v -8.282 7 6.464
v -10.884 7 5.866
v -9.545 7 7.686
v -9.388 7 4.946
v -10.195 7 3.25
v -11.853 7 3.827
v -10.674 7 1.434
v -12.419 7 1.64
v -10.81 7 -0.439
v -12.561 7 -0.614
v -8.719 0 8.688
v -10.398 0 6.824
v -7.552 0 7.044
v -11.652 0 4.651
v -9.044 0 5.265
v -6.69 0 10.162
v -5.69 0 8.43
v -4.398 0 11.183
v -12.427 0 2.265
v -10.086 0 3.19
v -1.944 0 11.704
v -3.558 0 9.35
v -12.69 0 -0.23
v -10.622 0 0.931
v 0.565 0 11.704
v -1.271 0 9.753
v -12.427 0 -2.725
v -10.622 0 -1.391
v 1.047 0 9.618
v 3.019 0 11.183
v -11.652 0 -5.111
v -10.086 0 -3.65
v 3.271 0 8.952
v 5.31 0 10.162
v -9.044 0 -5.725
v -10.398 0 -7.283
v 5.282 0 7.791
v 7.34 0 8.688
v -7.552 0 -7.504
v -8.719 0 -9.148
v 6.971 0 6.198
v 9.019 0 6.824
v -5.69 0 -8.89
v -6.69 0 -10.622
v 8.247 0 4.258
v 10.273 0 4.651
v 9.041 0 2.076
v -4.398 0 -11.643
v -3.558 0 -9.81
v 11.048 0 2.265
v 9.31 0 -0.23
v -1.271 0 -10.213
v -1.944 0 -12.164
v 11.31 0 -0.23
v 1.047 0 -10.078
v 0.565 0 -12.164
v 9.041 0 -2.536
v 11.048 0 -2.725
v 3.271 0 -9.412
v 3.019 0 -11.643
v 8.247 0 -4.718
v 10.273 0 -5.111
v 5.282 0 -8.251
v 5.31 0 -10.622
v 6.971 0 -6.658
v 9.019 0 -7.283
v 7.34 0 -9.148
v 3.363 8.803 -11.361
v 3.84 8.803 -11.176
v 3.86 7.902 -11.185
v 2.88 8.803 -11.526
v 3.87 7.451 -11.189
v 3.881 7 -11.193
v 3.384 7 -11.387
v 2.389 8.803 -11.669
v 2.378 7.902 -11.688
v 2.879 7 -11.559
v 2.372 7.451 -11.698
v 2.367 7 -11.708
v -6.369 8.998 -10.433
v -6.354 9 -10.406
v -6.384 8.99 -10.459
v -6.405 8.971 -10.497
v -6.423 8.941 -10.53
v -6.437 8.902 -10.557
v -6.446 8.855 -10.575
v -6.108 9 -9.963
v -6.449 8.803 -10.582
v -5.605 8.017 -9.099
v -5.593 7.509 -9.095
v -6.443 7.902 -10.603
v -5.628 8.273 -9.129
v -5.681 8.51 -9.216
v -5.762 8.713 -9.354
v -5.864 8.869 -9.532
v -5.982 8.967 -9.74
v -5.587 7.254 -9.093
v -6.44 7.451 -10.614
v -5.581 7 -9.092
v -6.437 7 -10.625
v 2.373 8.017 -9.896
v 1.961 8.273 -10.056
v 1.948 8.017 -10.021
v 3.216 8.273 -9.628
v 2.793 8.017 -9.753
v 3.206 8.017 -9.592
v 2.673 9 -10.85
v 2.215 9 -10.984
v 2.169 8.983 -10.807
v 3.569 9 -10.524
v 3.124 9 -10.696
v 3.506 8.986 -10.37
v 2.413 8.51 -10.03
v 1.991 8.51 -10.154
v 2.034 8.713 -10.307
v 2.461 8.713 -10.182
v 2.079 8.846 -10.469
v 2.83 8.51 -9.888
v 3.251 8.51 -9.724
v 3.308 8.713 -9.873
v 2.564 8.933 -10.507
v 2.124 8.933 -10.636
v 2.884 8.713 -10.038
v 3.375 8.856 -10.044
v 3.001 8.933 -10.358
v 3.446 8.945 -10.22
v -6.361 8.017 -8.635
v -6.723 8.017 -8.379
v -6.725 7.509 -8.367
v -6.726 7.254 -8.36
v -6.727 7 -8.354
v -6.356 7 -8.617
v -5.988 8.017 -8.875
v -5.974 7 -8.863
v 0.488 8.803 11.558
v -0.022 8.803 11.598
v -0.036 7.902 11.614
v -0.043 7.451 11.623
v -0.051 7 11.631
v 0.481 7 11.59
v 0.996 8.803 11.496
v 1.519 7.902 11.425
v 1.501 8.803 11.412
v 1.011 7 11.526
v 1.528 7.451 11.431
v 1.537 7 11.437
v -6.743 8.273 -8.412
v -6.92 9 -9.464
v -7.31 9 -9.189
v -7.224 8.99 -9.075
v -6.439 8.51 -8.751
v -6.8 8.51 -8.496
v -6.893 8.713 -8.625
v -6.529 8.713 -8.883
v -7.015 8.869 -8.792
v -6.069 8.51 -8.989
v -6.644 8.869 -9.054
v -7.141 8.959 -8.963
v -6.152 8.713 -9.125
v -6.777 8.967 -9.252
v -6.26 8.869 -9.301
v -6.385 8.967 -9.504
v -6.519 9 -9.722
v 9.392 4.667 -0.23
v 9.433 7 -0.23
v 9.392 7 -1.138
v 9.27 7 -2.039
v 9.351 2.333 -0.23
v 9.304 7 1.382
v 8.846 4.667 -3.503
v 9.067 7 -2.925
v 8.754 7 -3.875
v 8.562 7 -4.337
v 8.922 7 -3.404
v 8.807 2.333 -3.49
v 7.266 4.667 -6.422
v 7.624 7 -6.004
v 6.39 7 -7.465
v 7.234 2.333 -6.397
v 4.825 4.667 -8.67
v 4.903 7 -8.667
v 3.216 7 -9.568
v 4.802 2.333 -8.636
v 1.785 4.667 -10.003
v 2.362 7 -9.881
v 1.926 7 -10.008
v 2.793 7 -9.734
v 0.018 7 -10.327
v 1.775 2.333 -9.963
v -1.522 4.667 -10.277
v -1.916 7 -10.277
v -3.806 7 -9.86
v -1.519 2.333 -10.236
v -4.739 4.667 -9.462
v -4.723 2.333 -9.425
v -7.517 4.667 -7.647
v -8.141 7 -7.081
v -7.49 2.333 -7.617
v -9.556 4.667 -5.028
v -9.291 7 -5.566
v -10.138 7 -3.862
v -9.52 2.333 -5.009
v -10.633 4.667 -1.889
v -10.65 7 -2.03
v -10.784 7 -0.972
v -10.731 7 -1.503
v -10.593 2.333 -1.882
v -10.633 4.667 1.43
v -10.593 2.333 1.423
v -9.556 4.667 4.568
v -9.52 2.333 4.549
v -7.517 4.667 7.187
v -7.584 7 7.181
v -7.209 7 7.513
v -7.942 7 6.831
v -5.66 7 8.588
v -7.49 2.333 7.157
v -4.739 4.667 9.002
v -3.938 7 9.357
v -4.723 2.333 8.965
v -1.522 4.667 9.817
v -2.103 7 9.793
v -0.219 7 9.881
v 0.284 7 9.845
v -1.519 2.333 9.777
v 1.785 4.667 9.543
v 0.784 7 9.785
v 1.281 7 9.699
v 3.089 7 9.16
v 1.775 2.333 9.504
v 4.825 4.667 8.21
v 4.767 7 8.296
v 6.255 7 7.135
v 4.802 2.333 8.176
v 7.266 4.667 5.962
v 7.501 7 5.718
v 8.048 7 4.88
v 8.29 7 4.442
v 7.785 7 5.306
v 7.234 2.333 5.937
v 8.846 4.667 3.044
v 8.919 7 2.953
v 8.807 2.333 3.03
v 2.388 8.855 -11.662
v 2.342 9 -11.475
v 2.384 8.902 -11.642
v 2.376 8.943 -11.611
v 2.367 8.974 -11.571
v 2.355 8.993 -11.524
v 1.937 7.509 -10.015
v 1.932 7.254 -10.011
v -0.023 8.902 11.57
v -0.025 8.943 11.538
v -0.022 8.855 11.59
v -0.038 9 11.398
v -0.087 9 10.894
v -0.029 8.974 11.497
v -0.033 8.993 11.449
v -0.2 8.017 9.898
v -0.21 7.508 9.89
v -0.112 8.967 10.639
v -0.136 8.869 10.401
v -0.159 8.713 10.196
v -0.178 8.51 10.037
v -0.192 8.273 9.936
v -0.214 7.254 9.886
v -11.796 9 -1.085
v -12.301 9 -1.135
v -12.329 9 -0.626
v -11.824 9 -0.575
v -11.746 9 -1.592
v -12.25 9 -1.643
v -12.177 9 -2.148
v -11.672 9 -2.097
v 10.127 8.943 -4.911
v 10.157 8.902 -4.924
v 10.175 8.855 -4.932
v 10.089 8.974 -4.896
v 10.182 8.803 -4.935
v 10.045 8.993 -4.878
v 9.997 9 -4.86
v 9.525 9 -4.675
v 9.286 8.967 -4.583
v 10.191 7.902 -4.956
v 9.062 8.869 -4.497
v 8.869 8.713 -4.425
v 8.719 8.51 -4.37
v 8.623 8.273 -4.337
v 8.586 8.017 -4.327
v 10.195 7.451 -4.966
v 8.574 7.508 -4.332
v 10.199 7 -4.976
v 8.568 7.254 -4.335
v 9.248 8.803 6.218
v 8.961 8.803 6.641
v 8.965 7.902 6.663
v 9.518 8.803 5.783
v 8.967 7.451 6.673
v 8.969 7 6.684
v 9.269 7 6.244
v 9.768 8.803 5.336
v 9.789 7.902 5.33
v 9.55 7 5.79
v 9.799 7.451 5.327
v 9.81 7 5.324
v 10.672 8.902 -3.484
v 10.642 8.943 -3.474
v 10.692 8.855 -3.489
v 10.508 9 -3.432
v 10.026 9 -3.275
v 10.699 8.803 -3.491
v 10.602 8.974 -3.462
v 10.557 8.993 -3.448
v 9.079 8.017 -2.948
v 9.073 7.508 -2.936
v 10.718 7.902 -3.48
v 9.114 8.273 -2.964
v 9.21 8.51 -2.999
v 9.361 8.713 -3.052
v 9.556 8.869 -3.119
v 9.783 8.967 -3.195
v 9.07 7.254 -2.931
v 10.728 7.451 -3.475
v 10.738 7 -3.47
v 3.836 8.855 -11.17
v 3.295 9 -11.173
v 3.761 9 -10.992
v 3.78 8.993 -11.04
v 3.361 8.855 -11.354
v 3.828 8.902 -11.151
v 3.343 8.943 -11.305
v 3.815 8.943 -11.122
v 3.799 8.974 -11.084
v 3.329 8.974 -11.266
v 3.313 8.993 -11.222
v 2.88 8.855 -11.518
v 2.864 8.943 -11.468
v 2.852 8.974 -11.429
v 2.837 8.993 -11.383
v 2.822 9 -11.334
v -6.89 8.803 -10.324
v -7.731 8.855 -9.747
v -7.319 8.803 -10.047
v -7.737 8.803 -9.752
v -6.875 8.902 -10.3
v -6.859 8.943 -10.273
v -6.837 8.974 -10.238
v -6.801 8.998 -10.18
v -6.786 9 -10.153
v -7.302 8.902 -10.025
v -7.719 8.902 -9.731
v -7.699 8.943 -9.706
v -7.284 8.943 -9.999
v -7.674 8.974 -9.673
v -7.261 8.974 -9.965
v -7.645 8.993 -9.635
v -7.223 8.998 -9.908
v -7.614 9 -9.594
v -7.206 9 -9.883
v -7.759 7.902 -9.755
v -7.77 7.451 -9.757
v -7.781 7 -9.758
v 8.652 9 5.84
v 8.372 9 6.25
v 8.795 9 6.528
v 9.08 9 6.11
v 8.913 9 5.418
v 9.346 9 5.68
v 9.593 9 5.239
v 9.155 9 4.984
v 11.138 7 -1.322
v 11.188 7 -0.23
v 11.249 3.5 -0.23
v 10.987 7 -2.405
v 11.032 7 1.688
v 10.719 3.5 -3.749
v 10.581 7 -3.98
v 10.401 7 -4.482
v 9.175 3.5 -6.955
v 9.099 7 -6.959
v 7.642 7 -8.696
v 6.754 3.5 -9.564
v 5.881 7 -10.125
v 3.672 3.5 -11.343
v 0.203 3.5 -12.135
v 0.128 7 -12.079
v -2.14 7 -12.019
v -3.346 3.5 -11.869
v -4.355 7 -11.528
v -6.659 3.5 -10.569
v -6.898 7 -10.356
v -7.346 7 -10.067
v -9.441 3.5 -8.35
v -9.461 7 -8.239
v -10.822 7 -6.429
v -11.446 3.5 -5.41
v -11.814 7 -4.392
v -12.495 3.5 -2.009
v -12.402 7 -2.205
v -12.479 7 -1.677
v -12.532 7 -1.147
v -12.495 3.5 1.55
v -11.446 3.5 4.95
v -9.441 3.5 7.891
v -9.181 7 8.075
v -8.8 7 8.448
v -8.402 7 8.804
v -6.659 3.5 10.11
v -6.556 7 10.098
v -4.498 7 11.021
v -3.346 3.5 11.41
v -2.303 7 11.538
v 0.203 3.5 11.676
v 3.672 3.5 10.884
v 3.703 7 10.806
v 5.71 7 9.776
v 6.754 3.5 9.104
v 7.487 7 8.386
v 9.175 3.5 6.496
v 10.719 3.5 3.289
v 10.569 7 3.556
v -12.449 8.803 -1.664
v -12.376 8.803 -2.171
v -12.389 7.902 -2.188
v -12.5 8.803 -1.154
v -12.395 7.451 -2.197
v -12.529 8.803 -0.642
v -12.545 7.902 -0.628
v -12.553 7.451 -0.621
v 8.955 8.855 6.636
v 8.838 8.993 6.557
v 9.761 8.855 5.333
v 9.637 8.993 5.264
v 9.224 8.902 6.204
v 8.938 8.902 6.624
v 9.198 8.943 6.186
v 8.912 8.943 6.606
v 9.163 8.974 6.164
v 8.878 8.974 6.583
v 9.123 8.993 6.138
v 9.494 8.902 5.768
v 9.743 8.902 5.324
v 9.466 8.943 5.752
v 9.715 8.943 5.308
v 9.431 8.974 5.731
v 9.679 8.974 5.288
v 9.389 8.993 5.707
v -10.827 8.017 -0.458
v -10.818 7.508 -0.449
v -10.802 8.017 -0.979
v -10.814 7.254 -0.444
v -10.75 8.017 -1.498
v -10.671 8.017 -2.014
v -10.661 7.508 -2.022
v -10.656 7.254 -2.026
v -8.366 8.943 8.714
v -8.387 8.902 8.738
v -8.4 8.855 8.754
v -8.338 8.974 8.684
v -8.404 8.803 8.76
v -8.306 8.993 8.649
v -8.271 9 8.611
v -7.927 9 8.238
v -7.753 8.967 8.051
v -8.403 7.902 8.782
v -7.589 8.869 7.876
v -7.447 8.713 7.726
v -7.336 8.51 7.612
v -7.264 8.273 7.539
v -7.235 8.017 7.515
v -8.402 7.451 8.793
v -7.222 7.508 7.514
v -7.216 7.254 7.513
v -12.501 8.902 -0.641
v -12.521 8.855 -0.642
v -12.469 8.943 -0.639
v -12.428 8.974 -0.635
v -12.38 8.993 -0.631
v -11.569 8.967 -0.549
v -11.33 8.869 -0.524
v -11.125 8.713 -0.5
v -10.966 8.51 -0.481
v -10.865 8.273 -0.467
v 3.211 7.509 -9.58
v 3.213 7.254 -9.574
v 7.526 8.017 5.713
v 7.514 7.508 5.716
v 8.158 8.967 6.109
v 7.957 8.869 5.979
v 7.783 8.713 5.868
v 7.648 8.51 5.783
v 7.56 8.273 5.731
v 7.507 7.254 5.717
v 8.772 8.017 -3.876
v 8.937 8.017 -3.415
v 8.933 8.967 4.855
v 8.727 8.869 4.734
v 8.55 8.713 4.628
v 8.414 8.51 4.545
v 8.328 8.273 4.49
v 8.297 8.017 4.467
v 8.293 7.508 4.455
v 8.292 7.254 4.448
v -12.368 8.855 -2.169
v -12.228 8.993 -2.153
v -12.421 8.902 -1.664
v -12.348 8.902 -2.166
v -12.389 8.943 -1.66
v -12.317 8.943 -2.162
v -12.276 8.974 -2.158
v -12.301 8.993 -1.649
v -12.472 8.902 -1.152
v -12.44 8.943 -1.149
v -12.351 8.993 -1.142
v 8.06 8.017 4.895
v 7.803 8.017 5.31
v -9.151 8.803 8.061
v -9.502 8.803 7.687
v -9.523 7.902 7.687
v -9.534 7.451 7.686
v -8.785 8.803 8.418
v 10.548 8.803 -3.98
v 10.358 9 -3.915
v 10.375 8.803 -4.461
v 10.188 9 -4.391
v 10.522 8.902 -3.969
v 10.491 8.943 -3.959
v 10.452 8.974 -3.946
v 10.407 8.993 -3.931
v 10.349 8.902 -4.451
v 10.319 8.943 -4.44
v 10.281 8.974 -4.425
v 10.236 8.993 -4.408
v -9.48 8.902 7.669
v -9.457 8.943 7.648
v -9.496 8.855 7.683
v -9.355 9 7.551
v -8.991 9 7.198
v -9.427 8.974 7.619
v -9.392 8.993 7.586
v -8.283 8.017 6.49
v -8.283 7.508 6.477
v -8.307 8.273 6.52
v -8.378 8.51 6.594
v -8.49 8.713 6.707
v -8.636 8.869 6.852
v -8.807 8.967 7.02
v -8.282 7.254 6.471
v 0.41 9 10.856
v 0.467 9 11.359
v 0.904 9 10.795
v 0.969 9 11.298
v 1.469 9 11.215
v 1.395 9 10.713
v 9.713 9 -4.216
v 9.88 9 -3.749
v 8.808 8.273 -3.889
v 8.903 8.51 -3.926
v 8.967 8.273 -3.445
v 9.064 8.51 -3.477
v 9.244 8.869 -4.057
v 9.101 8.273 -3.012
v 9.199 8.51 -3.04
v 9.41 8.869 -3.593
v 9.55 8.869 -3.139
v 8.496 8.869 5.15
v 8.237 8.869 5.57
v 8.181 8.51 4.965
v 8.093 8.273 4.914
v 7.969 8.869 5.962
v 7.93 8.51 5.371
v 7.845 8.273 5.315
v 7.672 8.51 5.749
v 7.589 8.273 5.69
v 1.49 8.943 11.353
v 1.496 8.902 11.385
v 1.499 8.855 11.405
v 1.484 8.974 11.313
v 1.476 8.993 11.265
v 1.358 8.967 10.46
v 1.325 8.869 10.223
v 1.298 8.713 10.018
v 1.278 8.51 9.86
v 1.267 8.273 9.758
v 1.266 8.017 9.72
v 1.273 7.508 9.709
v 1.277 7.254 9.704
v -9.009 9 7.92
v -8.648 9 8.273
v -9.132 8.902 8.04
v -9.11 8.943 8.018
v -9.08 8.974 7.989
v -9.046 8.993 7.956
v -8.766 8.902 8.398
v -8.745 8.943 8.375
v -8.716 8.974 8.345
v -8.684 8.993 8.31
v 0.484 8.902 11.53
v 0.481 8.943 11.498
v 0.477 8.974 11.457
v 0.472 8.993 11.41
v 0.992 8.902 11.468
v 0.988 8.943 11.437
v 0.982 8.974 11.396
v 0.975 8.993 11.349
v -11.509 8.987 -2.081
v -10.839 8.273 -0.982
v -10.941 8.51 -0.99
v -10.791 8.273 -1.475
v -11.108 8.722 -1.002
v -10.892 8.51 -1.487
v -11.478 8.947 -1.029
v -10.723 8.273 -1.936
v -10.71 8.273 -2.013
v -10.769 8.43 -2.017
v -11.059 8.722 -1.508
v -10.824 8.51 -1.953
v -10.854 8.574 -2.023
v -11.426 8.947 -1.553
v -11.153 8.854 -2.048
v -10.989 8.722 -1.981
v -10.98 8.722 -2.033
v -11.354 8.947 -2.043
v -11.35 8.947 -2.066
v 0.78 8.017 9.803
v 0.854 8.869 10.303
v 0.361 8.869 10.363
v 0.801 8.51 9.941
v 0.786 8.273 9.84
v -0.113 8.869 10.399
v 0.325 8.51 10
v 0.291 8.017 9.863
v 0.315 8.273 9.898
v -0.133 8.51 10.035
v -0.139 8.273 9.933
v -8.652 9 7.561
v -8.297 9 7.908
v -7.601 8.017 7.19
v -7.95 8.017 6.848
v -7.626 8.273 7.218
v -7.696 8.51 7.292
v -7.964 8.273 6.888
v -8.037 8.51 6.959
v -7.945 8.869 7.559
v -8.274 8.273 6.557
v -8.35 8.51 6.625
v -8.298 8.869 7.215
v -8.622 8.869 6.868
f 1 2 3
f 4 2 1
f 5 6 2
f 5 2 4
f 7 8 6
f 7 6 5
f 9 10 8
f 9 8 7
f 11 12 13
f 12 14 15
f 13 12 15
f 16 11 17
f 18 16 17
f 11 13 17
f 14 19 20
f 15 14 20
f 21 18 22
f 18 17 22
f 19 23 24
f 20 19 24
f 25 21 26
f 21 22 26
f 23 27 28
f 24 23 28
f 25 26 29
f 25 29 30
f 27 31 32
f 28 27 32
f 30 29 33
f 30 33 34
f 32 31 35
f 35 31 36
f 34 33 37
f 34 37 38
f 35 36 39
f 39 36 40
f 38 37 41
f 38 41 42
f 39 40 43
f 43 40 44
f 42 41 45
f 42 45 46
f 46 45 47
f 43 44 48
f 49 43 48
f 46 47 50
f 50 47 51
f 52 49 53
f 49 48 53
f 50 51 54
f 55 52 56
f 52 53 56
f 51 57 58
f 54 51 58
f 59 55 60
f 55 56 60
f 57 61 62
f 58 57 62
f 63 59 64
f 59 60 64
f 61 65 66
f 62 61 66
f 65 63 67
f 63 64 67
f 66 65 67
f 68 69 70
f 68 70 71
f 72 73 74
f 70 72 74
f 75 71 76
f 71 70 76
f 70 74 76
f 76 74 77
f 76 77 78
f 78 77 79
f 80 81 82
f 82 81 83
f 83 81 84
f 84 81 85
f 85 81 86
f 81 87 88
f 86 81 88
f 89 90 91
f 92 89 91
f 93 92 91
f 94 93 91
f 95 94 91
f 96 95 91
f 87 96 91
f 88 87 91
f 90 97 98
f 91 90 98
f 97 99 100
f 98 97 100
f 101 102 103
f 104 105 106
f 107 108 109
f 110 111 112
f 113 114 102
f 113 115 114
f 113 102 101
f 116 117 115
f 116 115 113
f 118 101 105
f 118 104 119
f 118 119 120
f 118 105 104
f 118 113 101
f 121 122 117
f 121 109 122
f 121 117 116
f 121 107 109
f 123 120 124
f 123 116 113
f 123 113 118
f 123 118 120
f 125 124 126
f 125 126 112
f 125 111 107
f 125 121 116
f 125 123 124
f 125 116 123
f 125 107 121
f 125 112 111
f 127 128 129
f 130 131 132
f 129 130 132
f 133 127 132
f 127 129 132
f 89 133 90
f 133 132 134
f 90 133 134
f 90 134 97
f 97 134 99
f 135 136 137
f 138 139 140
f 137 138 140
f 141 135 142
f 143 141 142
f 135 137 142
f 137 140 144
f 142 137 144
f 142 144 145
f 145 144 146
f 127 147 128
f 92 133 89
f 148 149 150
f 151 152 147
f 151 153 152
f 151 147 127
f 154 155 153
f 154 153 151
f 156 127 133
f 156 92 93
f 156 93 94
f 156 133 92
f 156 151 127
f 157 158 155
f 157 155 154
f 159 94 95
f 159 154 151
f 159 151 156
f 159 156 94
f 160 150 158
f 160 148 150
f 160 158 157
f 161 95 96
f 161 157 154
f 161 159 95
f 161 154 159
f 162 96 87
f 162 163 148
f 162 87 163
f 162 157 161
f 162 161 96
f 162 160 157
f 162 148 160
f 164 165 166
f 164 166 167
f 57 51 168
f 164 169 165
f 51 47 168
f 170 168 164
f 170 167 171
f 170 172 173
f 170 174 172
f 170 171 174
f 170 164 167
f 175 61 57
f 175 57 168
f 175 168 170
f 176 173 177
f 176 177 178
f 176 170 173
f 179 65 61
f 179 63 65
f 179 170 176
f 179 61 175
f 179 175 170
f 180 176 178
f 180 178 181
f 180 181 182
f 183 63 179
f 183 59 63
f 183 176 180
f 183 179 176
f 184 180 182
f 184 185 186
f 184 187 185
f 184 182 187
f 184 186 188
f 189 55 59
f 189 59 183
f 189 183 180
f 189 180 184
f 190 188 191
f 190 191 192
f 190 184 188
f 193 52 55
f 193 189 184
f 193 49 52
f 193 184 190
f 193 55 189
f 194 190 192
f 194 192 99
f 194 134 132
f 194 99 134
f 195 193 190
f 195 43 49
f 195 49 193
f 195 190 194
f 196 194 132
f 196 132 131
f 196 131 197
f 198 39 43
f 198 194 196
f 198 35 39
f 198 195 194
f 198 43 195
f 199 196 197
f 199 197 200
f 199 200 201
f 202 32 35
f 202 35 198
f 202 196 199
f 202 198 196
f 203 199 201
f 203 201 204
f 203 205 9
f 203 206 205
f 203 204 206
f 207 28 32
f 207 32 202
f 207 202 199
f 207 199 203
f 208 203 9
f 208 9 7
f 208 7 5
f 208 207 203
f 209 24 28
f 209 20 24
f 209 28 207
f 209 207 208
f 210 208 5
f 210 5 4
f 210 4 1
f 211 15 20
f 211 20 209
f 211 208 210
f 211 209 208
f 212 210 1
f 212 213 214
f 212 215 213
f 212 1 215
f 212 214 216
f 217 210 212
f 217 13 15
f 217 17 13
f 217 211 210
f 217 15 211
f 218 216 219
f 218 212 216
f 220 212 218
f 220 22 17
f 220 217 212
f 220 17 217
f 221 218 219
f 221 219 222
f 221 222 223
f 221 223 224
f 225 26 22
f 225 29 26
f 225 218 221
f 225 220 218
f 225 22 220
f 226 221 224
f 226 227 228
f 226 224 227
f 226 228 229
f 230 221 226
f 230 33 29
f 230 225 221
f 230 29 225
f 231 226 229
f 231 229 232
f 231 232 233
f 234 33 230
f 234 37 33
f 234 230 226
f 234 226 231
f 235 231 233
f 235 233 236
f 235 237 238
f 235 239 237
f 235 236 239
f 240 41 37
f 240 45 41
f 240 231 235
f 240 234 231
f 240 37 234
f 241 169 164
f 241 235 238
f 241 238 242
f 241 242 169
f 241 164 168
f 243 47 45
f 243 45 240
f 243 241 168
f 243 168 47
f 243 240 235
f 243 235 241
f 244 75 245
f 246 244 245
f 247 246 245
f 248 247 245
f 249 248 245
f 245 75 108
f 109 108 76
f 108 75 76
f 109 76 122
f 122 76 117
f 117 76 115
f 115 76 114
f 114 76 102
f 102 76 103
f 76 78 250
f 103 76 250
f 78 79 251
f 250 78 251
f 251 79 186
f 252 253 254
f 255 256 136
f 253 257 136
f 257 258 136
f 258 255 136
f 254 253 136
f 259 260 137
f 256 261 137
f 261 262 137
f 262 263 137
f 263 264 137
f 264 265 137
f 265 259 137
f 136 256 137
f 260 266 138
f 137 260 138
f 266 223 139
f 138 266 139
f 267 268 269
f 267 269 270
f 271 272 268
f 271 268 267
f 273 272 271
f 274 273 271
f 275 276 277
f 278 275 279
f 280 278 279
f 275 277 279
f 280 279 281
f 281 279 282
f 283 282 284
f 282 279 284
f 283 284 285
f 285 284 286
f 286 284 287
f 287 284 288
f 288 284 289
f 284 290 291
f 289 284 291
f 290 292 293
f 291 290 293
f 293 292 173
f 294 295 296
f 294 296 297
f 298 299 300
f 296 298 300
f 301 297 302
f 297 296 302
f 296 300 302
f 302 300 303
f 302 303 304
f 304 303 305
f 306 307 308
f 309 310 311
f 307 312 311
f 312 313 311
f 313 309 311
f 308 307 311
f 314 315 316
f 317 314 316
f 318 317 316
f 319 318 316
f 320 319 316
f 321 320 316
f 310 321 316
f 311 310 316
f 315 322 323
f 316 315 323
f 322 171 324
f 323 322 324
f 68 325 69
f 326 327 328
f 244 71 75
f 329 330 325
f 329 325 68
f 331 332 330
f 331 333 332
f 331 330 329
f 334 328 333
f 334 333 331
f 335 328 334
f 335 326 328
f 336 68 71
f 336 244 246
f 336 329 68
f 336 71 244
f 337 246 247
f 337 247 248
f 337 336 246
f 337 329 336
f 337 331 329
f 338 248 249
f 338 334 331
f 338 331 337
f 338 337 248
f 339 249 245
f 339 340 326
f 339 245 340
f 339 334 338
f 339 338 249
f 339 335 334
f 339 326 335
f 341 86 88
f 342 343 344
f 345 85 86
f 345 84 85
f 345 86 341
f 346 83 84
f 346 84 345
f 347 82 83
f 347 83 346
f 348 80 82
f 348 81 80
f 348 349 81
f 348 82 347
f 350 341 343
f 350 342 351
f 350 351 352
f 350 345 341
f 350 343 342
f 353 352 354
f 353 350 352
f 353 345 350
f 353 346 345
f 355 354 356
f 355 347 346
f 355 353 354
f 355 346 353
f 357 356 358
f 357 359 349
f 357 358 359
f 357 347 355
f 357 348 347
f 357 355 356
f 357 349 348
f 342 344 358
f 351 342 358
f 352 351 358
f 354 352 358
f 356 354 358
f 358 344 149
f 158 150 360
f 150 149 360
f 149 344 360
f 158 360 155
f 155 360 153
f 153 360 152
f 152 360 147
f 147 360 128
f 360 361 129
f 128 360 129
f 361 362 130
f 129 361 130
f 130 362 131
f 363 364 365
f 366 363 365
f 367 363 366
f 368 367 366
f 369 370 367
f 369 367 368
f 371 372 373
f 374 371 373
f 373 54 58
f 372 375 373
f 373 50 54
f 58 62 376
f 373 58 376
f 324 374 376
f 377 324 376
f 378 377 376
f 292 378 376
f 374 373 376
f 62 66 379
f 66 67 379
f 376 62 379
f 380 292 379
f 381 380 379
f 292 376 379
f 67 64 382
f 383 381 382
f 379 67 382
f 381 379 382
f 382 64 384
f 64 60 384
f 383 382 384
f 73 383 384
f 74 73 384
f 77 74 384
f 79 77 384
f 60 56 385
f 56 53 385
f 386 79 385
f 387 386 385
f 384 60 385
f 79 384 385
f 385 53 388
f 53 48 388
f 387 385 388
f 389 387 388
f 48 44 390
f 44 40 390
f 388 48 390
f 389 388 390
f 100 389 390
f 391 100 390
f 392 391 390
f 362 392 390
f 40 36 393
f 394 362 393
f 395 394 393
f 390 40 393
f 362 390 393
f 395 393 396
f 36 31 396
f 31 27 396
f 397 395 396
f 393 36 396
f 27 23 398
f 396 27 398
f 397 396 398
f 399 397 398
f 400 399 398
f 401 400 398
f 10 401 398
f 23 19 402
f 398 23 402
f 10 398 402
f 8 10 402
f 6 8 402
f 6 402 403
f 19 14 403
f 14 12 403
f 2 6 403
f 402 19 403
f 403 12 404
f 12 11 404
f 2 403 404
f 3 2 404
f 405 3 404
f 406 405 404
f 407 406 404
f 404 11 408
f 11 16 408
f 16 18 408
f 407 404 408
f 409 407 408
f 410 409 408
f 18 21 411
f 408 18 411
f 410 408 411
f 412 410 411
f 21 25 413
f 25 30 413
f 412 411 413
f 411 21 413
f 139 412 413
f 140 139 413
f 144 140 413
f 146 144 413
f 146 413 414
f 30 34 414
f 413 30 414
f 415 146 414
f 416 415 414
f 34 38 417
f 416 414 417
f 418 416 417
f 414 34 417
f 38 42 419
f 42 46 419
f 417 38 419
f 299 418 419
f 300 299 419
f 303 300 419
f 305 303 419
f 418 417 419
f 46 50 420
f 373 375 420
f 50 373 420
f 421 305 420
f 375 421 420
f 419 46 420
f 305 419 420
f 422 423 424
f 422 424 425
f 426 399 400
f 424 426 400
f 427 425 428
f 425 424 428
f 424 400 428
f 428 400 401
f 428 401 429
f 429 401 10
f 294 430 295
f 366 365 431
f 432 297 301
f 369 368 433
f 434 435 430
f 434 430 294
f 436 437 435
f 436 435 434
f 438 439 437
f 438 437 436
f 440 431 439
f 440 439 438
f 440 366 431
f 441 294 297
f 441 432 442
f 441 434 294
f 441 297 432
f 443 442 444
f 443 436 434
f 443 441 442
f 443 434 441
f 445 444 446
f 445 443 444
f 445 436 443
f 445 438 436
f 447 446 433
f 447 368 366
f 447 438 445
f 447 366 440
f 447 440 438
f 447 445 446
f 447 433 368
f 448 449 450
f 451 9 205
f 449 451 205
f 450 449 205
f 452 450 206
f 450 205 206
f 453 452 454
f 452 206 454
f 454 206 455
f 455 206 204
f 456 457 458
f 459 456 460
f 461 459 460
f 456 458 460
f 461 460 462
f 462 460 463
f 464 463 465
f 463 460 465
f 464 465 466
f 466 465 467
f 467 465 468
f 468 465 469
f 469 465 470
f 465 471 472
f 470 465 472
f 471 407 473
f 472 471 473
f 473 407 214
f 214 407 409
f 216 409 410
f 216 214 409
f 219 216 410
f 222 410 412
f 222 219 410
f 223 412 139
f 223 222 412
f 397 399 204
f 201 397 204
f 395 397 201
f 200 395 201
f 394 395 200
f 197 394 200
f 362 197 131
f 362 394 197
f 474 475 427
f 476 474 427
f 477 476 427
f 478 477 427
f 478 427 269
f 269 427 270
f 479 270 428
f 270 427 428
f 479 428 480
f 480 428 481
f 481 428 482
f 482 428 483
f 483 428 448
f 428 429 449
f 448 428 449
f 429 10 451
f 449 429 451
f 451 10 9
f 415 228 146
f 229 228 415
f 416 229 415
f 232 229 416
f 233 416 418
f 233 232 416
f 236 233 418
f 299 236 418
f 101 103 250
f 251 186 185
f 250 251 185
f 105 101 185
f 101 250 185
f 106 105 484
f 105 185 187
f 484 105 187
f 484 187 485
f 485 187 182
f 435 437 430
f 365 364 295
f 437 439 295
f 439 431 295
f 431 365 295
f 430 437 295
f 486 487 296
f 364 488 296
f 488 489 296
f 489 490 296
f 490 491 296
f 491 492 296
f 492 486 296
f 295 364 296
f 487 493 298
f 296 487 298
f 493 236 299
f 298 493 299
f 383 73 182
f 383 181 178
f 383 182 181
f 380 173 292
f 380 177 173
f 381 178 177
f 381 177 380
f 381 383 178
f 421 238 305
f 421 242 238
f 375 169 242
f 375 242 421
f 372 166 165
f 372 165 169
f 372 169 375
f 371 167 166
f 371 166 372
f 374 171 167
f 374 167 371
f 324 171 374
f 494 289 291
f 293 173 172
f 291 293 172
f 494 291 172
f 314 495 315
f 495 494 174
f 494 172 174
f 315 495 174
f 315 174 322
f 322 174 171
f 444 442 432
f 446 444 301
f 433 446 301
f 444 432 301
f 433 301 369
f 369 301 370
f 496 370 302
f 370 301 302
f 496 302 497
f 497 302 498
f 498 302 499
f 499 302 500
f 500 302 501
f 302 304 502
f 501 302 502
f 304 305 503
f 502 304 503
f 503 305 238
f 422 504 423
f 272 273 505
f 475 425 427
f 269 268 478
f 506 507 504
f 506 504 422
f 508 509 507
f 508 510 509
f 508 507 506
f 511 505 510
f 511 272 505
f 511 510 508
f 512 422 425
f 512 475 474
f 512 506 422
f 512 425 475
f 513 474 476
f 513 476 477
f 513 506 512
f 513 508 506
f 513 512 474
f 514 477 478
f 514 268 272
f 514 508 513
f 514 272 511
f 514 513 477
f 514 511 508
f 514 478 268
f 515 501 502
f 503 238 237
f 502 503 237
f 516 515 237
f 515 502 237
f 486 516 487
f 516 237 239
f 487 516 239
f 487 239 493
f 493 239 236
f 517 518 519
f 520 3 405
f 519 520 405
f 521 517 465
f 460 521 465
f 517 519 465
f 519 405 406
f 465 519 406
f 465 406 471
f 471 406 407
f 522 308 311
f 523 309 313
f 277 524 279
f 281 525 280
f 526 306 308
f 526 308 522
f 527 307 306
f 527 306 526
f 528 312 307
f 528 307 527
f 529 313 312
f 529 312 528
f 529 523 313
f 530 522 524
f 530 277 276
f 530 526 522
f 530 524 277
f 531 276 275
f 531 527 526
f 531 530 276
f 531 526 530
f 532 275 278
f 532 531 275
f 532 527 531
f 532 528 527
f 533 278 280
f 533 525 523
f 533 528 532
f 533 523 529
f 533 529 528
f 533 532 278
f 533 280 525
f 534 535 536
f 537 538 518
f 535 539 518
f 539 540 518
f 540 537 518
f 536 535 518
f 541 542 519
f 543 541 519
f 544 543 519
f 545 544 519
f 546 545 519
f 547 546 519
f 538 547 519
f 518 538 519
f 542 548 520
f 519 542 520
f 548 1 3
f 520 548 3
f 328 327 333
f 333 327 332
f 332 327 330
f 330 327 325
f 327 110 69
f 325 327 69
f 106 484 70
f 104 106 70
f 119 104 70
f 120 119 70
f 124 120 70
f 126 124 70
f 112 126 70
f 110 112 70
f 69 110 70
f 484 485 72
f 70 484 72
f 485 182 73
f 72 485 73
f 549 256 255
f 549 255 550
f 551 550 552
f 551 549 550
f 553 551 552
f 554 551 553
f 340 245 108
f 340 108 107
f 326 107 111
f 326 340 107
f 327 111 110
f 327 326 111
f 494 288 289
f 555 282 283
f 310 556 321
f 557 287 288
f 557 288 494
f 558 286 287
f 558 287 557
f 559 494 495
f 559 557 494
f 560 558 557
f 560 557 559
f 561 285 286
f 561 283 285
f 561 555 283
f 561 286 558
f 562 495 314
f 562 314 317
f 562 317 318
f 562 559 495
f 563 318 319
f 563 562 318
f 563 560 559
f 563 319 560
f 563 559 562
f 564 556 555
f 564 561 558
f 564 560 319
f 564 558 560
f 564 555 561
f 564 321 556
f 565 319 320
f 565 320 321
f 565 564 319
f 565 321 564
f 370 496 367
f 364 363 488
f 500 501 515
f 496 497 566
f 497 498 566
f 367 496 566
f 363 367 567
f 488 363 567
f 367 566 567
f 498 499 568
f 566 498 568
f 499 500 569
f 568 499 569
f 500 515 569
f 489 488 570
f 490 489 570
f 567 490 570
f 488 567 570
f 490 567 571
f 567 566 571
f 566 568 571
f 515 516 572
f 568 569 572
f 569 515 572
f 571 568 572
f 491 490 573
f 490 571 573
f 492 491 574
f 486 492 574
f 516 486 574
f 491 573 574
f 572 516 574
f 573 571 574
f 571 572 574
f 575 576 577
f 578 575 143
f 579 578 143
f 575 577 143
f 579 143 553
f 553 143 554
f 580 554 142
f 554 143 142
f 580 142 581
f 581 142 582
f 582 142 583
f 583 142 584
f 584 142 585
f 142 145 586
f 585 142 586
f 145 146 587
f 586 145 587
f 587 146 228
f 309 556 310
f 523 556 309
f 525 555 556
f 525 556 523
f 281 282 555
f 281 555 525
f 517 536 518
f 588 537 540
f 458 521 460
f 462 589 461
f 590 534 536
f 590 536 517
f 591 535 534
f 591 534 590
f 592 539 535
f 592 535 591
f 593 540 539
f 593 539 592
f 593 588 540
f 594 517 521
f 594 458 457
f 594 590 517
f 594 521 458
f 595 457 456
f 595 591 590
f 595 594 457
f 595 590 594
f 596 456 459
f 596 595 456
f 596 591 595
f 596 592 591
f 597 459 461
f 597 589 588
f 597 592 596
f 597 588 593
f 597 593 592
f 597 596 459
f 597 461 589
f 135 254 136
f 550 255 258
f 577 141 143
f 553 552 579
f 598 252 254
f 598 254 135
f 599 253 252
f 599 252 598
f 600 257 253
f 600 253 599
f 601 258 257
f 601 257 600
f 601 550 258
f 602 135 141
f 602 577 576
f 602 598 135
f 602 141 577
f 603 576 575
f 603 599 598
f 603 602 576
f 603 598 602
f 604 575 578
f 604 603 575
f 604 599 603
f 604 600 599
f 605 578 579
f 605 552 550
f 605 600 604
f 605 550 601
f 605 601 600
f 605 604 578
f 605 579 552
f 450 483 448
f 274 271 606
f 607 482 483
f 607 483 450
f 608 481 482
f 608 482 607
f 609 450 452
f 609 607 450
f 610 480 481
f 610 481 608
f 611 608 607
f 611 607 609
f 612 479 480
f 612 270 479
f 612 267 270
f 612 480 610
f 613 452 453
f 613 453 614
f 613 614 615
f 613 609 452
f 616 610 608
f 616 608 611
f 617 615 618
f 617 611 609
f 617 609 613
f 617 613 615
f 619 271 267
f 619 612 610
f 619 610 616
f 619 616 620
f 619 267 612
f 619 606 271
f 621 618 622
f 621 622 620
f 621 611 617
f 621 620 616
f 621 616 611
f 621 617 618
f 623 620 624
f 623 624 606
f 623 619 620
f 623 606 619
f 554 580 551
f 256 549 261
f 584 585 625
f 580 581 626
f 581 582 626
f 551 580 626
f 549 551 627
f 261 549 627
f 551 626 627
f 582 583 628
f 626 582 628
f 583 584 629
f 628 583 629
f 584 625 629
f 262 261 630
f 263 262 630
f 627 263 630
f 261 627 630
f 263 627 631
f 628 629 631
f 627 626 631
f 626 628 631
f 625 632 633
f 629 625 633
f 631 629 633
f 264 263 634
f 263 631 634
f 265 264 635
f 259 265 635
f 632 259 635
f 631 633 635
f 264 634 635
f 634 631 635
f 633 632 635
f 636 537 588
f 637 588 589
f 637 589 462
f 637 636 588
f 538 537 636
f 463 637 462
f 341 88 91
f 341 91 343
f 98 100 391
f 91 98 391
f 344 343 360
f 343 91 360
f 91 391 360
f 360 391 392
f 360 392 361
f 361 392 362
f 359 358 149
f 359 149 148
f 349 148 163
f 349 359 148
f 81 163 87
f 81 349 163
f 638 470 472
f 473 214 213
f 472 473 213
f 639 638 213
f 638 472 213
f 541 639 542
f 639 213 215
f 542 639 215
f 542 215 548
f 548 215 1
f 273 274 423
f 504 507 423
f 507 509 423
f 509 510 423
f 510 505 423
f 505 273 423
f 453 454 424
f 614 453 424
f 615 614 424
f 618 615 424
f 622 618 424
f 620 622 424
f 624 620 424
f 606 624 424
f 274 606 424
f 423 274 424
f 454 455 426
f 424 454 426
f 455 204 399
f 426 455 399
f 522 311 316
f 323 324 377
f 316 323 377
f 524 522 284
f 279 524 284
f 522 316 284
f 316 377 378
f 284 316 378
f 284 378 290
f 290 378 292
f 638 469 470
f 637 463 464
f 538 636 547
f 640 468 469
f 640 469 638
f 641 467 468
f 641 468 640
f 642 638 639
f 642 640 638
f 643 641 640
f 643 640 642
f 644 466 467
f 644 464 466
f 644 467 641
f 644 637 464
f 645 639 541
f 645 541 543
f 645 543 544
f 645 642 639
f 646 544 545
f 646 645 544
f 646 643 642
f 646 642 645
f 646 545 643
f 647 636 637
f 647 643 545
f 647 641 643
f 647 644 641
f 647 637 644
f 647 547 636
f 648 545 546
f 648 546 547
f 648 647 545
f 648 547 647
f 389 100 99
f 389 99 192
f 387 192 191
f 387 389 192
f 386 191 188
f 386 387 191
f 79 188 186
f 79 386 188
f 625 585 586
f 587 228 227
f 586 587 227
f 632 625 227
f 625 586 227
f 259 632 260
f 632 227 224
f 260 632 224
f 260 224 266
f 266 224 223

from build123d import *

# Parameters (mm, degrees)
SKETCH8_R                     = 12
SKETCH8_R_2                   = 10
BOSS_EXTRUDE5_DEPTH           = 7
BOSS_EXTRUDE5_DRAFT           = 1
BOSS_EXTRUDE7_DEPTH           = 2
BOSS_EXTRUDE7_DRAFT           = 1
BOSS_EXTRUDE7_PROFILE_2_DEPTH = 2
BOSS_EXTRUDE7_PROFILE_2_DRAFT = 1
BOSS_EXTRUDE7_PROFILE_3_DEPTH = 2
BOSS_EXTRUDE7_PROFILE_3_DRAFT = 1
BOSS_EXTRUDE7_PROFILE_4_DEPTH = 2
BOSS_EXTRUDE7_PROFILE_4_DRAFT = 1
BOSS_EXTRUDE7_PROFILE_5_DEPTH = 2
BOSS_EXTRUDE7_PROFILE_5_DRAFT = 1
BOSS_EXTRUDE7_PROFILE_6_DEPTH = 2
BOSS_EXTRUDE7_PROFILE_6_DRAFT = 1
BOSS_EXTRUDE7_PROFILE_7_DEPTH = 2
BOSS_EXTRUDE7_PROFILE_7_DRAFT = 1
FILLET3_R                     = 0.2
FILLET4_R                     = 1


with BuildPart() as part:
    # Sketch8 → Boss-Extrude5 (with draft: the straight prism first)
    with BuildSketch(Plane(origin=(0, 0, 0), x_dir=(1, 0, 0), z_dir=(0, 1, 0))):
        with Locations((-0.689500998, 0.229833666)):
            Circle(SKETCH8_R)
        with Locations((-0.689500998, 0.229833666)):
            Circle(SKETCH8_R_2, mode=Mode.SUBTRACT)
    extrude(amount=BOSS_EXTRUDE5_DEPTH)
    # Boss-Extrude5: the draft: its side faces are tilted about the plane it starts from
    boss_extrude5_sides = [part.faces().sort_by_distance(p)[0] for p in [
        (-12.689500998, 3.5, -0.229833666),
        (-10.689500998, 3.5, -0.229833666),
    ]]
    draft(boss_extrude5_sides, Plane(origin=(0, 0, 0), x_dir=(1, 0, 0), z_dir=(0, 1, 0)), BOSS_EXTRUDE5_DRAFT)


with BuildPart() as boss_extrude7_tool:
    # Sketch9 → Boss-Extrude7 (with draft: the straight prism first)
    with BuildSketch(Plane(origin=(0, 7, 0), x_dir=(1, 0, 0), z_dir=(0, 1, 0))):
        with BuildLine():
            ThreePointArc((-7.209347937, -7.512919996), (-7.765123044, -7.008550894), (-8.28199938, -6.464388222))
            Line((-8.28199938, -6.464388222), (-9.545268932, -7.685837669))
            ThreePointArc((-9.545268932, -7.685837669), (-8.992344967, -8.264002947), (-8.401756366, -8.803637179))
            Line((-8.401756366, -8.803637179), (-7.209347937, -7.512919996))
        make_face()
    extrude(amount=BOSS_EXTRUDE7_DEPTH)
    # Boss-Extrude7: the draft: its side faces are tilted about the plane it starts from
    boss_extrude7_sides = [boss_extrude7_tool.faces().sort_by_distance(p)[0] for p in [
        (-8.992344967, 8, 8.264002947),
        (-7.805552152, 8, 8.158278588),
        (-7.765123044, 8, 7.008550894),
        (-8.913634156, 8, 7.075112945),
    ]]
    draft(boss_extrude7_sides, Plane(origin=(0, 7, 0), x_dir=(1, 0, 0), z_dir=(0, 1, 0)), BOSS_EXTRUDE7_DRAFT)


with BuildPart() as part_1:
    add(part.part)

    # Boss-Extrude7: add boss_extrude7_tool
    add(boss_extrude7_tool.part)


with BuildPart() as boss_extrude7_profile_2_tool:
    # Sketch9 → Boss-Extrude7 profile 2 (with draft: the straight prism first)
    with BuildSketch(Plane(origin=(0, 7, 0), x_dir=(1, 0, 0), z_dir=(0, 1, 0))):
        with BuildLine():
            ThreePointArc((-10.809530951, 0.438716694), (-10.761410839, 1.237440003), (-10.650350336, 2.029866676))
            Line((-10.650350336, 2.029866676), (-12.401922464, 2.205096122))
            ThreePointArc((-12.401922464, 2.205096122), (-12.508319943, 1.412202953), (-12.56110308, 0.61394614))
            Line((-12.56110308, 0.61394614), (-10.809530951, 0.438716694))
        make_face()
    extrude(amount=BOSS_EXTRUDE7_PROFILE_2_DEPTH)
    # Boss-Extrude7 profile 2: the draft: its side faces are tilted about the plane it starts from
    boss_extrude7_profile_2_sides = [boss_extrude7_profile_2_tool.faces().sort_by_distance(p)[0] for p in [
        (-11.685317015, 8, -0.526331417),
        (-10.761410839, 8, -1.237440003),
        (-11.5261364, 8, -2.117481399),
        (-12.508319943, 8, -1.412202953),
    ]]
    draft(boss_extrude7_profile_2_sides, Plane(origin=(0, 7, 0), x_dir=(1, 0, 0), z_dir=(0, 1, 0)), BOSS_EXTRUDE7_PROFILE_2_DRAFT)


with BuildPart() as part_2:
    add(part_1.part)

    # Boss-Extrude7 profile 2: add boss_extrude7_profile_2_tool
    add(boss_extrude7_profile_2_tool.part)


with BuildPart() as boss_extrude7_profile_3_tool:
    # Sketch9 → Boss-Extrude7 profile 3 (with draft: the straight prism first)
    with BuildSketch(Plane(origin=(0, 7, 0), x_dir=(1, 0, 0), z_dir=(0, 1, 0))):
        with BuildLine():
            ThreePointArc((-6.727066623, 8.354268397), (-6.166482087, 8.742254974), (-5.581052028, 9.091626199))
            Line((-5.581052028, 9.091626199), (-6.436662035, 10.624669806))
            ThreePointArc((-6.436662035, 10.624669806), (-7.123347108, 10.214226618), (-7.78084598, 9.758490692))
            Line((-7.78084598, 9.758490692), (-6.727066623, 8.354268397))
        make_face()
    extrude(amount=BOSS_EXTRUDE7_PROFILE_3_DEPTH)
    # Boss-Extrude7 profile 3: the draft: its side faces are tilted about the plane it starts from
    boss_extrude7_profile_3_sides = [boss_extrude7_profile_3_tool.faces().sort_by_distance(p)[0] for p in [
        (-7.253956301, 8, -9.056379545),
        (-6.166482087, 8, -8.742254974),
        (-6.008857032, 8, -9.858148003),
        (-7.123347108, 8, -10.214226618),
    ]]
    draft(boss_extrude7_profile_3_sides, Plane(origin=(0, 7, 0), x_dir=(1, 0, 0), z_dir=(0, 1, 0)), BOSS_EXTRUDE7_PROFILE_3_DRAFT)


with BuildPart() as part_3:
    add(part_2.part)

    # Boss-Extrude7 profile 3: add boss_extrude7_profile_3_tool
    add(boss_extrude7_profile_3_tool.part)


with BuildPart() as boss_extrude7_profile_4_tool:
    # Sketch9 → Boss-Extrude7 profile 4 (with draft: the straight prism first)
    with BuildSketch(Plane(origin=(0, 7, 0), x_dir=(1, 0, 0), z_dir=(0, 1, 0))):
        with BuildLine():
            Line((2.366640727, 11.7077462), (1.926100917, 10.008241767))
            ThreePointArc((1.926100917, 10.008241767), (2.578394525, 9.809995315), (3.215863804, 9.568289863))
            Line((3.215863804, 9.568289863), (3.880694044, 11.193217982))
            ThreePointArc((3.880694044, 11.193217982), (3.132335987, 11.475990362), (2.366640727, 11.7077462))
        make_face()
    extrude(amount=BOSS_EXTRUDE7_PROFILE_4_DEPTH)
    # Boss-Extrude7 profile 4: the draft: its side faces are tilted about the plane it starts from
    boss_extrude7_profile_4_sides = [boss_extrude7_profile_4_tool.faces().sort_by_distance(p)[0] for p in [
        (3.132335987, 8, -11.475990362),
        (2.146370822, 8, -10.857993984),
        (2.578394525, 8, -9.809995315),
        (3.548278924, 8, -10.380753922),
    ]]
    draft(boss_extrude7_profile_4_sides, Plane(origin=(0, 7, 0), x_dir=(1, 0, 0), z_dir=(0, 1, 0)), BOSS_EXTRUDE7_PROFILE_4_DRAFT)


with BuildPart() as part_4:
    add(part_3.part)

    # Boss-Extrude7 profile 4: add boss_extrude7_profile_4_tool
    add(boss_extrude7_profile_4_tool.part)


with BuildPart() as boss_extrude7_profile_5_tool:
    # Sketch9 → Boss-Extrude7 profile 5 (with draft: the straight prism first)
    with BuildSketch(Plane(origin=(0, 7, 0), x_dir=(1, 0, 0), z_dir=(0, 1, 0))):
        with BuildLine():
            Line((10.198955387, 4.975778875), (8.561854638, 4.337272925))
            ThreePointArc((8.561854638, 4.337272925), (8.840763983, 3.640506293), (9.06727997, 2.92498923))
            Line((9.06727997, 2.92498923), (10.737769949, 3.470197392))
            ThreePointArc((10.737769949, 3.470197392), (10.493728209, 4.232065904), (10.198955387, 4.975778875))
        make_face()
    extrude(amount=BOSS_EXTRUDE7_PROFILE_5_DEPTH)
    # Boss-Extrude7 profile 5: the draft: its side faces are tilted about the plane it starts from
    boss_extrude7_profile_5_sides = [boss_extrude7_profile_5_tool.faces().sort_by_distance(p)[0] for p in [
        (10.493728209, 8, -4.232065904),
        (9.380405013, 8, -4.6565259),
        (8.840763983, 8, -3.640506293),
        (9.90252496, 8, -3.197593311),
    ]]
    draft(boss_extrude7_profile_5_sides, Plane(origin=(0, 7, 0), x_dir=(1, 0, 0), z_dir=(0, 1, 0)), BOSS_EXTRUDE7_PROFILE_5_DRAFT)


with BuildPart() as part_5:
    add(part_4.part)

    # Boss-Extrude7 profile 5: add boss_extrude7_profile_5_tool
    add(boss_extrude7_profile_5_tool.part)


with BuildPart() as boss_extrude7_profile_6_tool:
    # Sketch9 → Boss-Extrude7 profile 6 (with draft: the straight prism first)
    with BuildSketch(Plane(origin=(0, 7, 0), x_dir=(1, 0, 0), z_dir=(0, 1, 0))):
        with BuildLine():
            Line((9.809829479, -5.324132297), (8.289916221, -4.44228628))
            ThreePointArc((8.289916221, -4.44228628), (7.919054516, -5.094770576), (7.500866623, -5.717982455))
            Line((7.500866623, -5.717982455), (8.968653964, -6.684103064))
            ThreePointArc((8.968653964, -6.684103064), (9.412154061, -6.018289528), (9.809829479, -5.324132297))
        make_face()
    extrude(amount=BOSS_EXTRUDE7_PROFILE_6_DEPTH)
    # Boss-Extrude7 profile 6: the draft: its side faces are tilted about the plane it starts from
    boss_extrude7_profile_6_sides = [boss_extrude7_profile_6_tool.faces().sort_by_distance(p)[0] for p in [
        (9.04987285, 8, 4.883209289),
        (7.919054516, 8, 5.094770576),
        (8.234760293, 8, 6.20104276),
        (9.412154061, 8, 6.018289528),
    ]]
    draft(boss_extrude7_profile_6_sides, Plane(origin=(0, 7, 0), x_dir=(1, 0, 0), z_dir=(0, 1, 0)), BOSS_EXTRUDE7_PROFILE_6_DRAFT)


with BuildPart() as part_6:
    add(part_5.part)

    # Boss-Extrude7 profile 6: add boss_extrude7_profile_6_tool
    add(boss_extrude7_profile_6_tool.part)


with BuildPart() as boss_extrude7_profile_7_tool:
    # Sketch9 → Boss-Extrude7 profile 7 (with draft: the straight prism first)
    with BuildSketch(Plane(origin=(0, 7, 0), x_dir=(1, 0, 0), z_dir=(0, 1, 0))):
        with BuildLine():
            ThreePointArc((1.280752997, -9.698748185), (0.534166556, -9.818115184), (-0.219247003, -9.881422416))
            Line((-0.219247003, -9.881422416), (-0.050535252, -11.630781881))
            ThreePointArc((-0.050535252, -11.630781881), (0.746403959, -11.560868405), (1.536829397, -11.437468136))
            Line((1.536829397, -11.437468136), (1.280752997, -9.698748185))
        make_face()
    extrude(amount=BOSS_EXTRUDE7_PROFILE_7_DEPTH)
    # Boss-Extrude7 profile 7: the draft: its side faces are tilted about the plane it starts from
    boss_extrude7_profile_7_sides = [boss_extrude7_profile_7_tool.faces().sort_by_distance(p)[0] for p in [
        (1.408791197, 8, 10.568108161),
        (0.534166556, 8, 9.818115184),
        (-0.134891127, 8, 10.756102148),
        (0.746403959, 8, 11.560868405),
    ]]
    draft(boss_extrude7_profile_7_sides, Plane(origin=(0, 7, 0), x_dir=(1, 0, 0), z_dir=(0, 1, 0)), BOSS_EXTRUDE7_PROFILE_7_DRAFT)


with BuildPart() as part_7:
    add(part_6.part)

    # Boss-Extrude7 profile 7: add boss_extrude7_profile_7_tool
    add(boss_extrude7_profile_7_tool.part)

    # Fillet3
    fillet3_edges = [part_7.edges().sort_by_distance(p)[0] for p in [
        (-8.967942047, 9, 8.239038679),
        (0.742183685, 9, 11.526214308),
        (9.382464248, 9, 5.999925646),
        (10.460859537, 9, -4.220302928),
        (3.121321399, 9, -11.44286259),
        (-7.104320002, 9, -10.184957078),
        (-12.473583207, 9, -1.408727847),
    ]]
    fillet(fillet3_edges, radius=FILLET3_R)

    # Fillet4
    fillet4_edges = [part_7.edges().sort_by_distance(p)[0] for p in [
        (-6.18550884, 9, -8.771524863),
        (-10.796147575, 9, -1.240915109),
        (-7.789525964, 9, 7.033515162),
        (0.538386829, 9, 9.852769281),
        (7.948744329, 9, 5.113134459),
        (8.873632654, 9, -3.652269269),
        (2.589409961, 9, -9.843123094),
    ]]
    fillet(fillet4_edges, radius=FILLET4_R)


solid = part_7.part
